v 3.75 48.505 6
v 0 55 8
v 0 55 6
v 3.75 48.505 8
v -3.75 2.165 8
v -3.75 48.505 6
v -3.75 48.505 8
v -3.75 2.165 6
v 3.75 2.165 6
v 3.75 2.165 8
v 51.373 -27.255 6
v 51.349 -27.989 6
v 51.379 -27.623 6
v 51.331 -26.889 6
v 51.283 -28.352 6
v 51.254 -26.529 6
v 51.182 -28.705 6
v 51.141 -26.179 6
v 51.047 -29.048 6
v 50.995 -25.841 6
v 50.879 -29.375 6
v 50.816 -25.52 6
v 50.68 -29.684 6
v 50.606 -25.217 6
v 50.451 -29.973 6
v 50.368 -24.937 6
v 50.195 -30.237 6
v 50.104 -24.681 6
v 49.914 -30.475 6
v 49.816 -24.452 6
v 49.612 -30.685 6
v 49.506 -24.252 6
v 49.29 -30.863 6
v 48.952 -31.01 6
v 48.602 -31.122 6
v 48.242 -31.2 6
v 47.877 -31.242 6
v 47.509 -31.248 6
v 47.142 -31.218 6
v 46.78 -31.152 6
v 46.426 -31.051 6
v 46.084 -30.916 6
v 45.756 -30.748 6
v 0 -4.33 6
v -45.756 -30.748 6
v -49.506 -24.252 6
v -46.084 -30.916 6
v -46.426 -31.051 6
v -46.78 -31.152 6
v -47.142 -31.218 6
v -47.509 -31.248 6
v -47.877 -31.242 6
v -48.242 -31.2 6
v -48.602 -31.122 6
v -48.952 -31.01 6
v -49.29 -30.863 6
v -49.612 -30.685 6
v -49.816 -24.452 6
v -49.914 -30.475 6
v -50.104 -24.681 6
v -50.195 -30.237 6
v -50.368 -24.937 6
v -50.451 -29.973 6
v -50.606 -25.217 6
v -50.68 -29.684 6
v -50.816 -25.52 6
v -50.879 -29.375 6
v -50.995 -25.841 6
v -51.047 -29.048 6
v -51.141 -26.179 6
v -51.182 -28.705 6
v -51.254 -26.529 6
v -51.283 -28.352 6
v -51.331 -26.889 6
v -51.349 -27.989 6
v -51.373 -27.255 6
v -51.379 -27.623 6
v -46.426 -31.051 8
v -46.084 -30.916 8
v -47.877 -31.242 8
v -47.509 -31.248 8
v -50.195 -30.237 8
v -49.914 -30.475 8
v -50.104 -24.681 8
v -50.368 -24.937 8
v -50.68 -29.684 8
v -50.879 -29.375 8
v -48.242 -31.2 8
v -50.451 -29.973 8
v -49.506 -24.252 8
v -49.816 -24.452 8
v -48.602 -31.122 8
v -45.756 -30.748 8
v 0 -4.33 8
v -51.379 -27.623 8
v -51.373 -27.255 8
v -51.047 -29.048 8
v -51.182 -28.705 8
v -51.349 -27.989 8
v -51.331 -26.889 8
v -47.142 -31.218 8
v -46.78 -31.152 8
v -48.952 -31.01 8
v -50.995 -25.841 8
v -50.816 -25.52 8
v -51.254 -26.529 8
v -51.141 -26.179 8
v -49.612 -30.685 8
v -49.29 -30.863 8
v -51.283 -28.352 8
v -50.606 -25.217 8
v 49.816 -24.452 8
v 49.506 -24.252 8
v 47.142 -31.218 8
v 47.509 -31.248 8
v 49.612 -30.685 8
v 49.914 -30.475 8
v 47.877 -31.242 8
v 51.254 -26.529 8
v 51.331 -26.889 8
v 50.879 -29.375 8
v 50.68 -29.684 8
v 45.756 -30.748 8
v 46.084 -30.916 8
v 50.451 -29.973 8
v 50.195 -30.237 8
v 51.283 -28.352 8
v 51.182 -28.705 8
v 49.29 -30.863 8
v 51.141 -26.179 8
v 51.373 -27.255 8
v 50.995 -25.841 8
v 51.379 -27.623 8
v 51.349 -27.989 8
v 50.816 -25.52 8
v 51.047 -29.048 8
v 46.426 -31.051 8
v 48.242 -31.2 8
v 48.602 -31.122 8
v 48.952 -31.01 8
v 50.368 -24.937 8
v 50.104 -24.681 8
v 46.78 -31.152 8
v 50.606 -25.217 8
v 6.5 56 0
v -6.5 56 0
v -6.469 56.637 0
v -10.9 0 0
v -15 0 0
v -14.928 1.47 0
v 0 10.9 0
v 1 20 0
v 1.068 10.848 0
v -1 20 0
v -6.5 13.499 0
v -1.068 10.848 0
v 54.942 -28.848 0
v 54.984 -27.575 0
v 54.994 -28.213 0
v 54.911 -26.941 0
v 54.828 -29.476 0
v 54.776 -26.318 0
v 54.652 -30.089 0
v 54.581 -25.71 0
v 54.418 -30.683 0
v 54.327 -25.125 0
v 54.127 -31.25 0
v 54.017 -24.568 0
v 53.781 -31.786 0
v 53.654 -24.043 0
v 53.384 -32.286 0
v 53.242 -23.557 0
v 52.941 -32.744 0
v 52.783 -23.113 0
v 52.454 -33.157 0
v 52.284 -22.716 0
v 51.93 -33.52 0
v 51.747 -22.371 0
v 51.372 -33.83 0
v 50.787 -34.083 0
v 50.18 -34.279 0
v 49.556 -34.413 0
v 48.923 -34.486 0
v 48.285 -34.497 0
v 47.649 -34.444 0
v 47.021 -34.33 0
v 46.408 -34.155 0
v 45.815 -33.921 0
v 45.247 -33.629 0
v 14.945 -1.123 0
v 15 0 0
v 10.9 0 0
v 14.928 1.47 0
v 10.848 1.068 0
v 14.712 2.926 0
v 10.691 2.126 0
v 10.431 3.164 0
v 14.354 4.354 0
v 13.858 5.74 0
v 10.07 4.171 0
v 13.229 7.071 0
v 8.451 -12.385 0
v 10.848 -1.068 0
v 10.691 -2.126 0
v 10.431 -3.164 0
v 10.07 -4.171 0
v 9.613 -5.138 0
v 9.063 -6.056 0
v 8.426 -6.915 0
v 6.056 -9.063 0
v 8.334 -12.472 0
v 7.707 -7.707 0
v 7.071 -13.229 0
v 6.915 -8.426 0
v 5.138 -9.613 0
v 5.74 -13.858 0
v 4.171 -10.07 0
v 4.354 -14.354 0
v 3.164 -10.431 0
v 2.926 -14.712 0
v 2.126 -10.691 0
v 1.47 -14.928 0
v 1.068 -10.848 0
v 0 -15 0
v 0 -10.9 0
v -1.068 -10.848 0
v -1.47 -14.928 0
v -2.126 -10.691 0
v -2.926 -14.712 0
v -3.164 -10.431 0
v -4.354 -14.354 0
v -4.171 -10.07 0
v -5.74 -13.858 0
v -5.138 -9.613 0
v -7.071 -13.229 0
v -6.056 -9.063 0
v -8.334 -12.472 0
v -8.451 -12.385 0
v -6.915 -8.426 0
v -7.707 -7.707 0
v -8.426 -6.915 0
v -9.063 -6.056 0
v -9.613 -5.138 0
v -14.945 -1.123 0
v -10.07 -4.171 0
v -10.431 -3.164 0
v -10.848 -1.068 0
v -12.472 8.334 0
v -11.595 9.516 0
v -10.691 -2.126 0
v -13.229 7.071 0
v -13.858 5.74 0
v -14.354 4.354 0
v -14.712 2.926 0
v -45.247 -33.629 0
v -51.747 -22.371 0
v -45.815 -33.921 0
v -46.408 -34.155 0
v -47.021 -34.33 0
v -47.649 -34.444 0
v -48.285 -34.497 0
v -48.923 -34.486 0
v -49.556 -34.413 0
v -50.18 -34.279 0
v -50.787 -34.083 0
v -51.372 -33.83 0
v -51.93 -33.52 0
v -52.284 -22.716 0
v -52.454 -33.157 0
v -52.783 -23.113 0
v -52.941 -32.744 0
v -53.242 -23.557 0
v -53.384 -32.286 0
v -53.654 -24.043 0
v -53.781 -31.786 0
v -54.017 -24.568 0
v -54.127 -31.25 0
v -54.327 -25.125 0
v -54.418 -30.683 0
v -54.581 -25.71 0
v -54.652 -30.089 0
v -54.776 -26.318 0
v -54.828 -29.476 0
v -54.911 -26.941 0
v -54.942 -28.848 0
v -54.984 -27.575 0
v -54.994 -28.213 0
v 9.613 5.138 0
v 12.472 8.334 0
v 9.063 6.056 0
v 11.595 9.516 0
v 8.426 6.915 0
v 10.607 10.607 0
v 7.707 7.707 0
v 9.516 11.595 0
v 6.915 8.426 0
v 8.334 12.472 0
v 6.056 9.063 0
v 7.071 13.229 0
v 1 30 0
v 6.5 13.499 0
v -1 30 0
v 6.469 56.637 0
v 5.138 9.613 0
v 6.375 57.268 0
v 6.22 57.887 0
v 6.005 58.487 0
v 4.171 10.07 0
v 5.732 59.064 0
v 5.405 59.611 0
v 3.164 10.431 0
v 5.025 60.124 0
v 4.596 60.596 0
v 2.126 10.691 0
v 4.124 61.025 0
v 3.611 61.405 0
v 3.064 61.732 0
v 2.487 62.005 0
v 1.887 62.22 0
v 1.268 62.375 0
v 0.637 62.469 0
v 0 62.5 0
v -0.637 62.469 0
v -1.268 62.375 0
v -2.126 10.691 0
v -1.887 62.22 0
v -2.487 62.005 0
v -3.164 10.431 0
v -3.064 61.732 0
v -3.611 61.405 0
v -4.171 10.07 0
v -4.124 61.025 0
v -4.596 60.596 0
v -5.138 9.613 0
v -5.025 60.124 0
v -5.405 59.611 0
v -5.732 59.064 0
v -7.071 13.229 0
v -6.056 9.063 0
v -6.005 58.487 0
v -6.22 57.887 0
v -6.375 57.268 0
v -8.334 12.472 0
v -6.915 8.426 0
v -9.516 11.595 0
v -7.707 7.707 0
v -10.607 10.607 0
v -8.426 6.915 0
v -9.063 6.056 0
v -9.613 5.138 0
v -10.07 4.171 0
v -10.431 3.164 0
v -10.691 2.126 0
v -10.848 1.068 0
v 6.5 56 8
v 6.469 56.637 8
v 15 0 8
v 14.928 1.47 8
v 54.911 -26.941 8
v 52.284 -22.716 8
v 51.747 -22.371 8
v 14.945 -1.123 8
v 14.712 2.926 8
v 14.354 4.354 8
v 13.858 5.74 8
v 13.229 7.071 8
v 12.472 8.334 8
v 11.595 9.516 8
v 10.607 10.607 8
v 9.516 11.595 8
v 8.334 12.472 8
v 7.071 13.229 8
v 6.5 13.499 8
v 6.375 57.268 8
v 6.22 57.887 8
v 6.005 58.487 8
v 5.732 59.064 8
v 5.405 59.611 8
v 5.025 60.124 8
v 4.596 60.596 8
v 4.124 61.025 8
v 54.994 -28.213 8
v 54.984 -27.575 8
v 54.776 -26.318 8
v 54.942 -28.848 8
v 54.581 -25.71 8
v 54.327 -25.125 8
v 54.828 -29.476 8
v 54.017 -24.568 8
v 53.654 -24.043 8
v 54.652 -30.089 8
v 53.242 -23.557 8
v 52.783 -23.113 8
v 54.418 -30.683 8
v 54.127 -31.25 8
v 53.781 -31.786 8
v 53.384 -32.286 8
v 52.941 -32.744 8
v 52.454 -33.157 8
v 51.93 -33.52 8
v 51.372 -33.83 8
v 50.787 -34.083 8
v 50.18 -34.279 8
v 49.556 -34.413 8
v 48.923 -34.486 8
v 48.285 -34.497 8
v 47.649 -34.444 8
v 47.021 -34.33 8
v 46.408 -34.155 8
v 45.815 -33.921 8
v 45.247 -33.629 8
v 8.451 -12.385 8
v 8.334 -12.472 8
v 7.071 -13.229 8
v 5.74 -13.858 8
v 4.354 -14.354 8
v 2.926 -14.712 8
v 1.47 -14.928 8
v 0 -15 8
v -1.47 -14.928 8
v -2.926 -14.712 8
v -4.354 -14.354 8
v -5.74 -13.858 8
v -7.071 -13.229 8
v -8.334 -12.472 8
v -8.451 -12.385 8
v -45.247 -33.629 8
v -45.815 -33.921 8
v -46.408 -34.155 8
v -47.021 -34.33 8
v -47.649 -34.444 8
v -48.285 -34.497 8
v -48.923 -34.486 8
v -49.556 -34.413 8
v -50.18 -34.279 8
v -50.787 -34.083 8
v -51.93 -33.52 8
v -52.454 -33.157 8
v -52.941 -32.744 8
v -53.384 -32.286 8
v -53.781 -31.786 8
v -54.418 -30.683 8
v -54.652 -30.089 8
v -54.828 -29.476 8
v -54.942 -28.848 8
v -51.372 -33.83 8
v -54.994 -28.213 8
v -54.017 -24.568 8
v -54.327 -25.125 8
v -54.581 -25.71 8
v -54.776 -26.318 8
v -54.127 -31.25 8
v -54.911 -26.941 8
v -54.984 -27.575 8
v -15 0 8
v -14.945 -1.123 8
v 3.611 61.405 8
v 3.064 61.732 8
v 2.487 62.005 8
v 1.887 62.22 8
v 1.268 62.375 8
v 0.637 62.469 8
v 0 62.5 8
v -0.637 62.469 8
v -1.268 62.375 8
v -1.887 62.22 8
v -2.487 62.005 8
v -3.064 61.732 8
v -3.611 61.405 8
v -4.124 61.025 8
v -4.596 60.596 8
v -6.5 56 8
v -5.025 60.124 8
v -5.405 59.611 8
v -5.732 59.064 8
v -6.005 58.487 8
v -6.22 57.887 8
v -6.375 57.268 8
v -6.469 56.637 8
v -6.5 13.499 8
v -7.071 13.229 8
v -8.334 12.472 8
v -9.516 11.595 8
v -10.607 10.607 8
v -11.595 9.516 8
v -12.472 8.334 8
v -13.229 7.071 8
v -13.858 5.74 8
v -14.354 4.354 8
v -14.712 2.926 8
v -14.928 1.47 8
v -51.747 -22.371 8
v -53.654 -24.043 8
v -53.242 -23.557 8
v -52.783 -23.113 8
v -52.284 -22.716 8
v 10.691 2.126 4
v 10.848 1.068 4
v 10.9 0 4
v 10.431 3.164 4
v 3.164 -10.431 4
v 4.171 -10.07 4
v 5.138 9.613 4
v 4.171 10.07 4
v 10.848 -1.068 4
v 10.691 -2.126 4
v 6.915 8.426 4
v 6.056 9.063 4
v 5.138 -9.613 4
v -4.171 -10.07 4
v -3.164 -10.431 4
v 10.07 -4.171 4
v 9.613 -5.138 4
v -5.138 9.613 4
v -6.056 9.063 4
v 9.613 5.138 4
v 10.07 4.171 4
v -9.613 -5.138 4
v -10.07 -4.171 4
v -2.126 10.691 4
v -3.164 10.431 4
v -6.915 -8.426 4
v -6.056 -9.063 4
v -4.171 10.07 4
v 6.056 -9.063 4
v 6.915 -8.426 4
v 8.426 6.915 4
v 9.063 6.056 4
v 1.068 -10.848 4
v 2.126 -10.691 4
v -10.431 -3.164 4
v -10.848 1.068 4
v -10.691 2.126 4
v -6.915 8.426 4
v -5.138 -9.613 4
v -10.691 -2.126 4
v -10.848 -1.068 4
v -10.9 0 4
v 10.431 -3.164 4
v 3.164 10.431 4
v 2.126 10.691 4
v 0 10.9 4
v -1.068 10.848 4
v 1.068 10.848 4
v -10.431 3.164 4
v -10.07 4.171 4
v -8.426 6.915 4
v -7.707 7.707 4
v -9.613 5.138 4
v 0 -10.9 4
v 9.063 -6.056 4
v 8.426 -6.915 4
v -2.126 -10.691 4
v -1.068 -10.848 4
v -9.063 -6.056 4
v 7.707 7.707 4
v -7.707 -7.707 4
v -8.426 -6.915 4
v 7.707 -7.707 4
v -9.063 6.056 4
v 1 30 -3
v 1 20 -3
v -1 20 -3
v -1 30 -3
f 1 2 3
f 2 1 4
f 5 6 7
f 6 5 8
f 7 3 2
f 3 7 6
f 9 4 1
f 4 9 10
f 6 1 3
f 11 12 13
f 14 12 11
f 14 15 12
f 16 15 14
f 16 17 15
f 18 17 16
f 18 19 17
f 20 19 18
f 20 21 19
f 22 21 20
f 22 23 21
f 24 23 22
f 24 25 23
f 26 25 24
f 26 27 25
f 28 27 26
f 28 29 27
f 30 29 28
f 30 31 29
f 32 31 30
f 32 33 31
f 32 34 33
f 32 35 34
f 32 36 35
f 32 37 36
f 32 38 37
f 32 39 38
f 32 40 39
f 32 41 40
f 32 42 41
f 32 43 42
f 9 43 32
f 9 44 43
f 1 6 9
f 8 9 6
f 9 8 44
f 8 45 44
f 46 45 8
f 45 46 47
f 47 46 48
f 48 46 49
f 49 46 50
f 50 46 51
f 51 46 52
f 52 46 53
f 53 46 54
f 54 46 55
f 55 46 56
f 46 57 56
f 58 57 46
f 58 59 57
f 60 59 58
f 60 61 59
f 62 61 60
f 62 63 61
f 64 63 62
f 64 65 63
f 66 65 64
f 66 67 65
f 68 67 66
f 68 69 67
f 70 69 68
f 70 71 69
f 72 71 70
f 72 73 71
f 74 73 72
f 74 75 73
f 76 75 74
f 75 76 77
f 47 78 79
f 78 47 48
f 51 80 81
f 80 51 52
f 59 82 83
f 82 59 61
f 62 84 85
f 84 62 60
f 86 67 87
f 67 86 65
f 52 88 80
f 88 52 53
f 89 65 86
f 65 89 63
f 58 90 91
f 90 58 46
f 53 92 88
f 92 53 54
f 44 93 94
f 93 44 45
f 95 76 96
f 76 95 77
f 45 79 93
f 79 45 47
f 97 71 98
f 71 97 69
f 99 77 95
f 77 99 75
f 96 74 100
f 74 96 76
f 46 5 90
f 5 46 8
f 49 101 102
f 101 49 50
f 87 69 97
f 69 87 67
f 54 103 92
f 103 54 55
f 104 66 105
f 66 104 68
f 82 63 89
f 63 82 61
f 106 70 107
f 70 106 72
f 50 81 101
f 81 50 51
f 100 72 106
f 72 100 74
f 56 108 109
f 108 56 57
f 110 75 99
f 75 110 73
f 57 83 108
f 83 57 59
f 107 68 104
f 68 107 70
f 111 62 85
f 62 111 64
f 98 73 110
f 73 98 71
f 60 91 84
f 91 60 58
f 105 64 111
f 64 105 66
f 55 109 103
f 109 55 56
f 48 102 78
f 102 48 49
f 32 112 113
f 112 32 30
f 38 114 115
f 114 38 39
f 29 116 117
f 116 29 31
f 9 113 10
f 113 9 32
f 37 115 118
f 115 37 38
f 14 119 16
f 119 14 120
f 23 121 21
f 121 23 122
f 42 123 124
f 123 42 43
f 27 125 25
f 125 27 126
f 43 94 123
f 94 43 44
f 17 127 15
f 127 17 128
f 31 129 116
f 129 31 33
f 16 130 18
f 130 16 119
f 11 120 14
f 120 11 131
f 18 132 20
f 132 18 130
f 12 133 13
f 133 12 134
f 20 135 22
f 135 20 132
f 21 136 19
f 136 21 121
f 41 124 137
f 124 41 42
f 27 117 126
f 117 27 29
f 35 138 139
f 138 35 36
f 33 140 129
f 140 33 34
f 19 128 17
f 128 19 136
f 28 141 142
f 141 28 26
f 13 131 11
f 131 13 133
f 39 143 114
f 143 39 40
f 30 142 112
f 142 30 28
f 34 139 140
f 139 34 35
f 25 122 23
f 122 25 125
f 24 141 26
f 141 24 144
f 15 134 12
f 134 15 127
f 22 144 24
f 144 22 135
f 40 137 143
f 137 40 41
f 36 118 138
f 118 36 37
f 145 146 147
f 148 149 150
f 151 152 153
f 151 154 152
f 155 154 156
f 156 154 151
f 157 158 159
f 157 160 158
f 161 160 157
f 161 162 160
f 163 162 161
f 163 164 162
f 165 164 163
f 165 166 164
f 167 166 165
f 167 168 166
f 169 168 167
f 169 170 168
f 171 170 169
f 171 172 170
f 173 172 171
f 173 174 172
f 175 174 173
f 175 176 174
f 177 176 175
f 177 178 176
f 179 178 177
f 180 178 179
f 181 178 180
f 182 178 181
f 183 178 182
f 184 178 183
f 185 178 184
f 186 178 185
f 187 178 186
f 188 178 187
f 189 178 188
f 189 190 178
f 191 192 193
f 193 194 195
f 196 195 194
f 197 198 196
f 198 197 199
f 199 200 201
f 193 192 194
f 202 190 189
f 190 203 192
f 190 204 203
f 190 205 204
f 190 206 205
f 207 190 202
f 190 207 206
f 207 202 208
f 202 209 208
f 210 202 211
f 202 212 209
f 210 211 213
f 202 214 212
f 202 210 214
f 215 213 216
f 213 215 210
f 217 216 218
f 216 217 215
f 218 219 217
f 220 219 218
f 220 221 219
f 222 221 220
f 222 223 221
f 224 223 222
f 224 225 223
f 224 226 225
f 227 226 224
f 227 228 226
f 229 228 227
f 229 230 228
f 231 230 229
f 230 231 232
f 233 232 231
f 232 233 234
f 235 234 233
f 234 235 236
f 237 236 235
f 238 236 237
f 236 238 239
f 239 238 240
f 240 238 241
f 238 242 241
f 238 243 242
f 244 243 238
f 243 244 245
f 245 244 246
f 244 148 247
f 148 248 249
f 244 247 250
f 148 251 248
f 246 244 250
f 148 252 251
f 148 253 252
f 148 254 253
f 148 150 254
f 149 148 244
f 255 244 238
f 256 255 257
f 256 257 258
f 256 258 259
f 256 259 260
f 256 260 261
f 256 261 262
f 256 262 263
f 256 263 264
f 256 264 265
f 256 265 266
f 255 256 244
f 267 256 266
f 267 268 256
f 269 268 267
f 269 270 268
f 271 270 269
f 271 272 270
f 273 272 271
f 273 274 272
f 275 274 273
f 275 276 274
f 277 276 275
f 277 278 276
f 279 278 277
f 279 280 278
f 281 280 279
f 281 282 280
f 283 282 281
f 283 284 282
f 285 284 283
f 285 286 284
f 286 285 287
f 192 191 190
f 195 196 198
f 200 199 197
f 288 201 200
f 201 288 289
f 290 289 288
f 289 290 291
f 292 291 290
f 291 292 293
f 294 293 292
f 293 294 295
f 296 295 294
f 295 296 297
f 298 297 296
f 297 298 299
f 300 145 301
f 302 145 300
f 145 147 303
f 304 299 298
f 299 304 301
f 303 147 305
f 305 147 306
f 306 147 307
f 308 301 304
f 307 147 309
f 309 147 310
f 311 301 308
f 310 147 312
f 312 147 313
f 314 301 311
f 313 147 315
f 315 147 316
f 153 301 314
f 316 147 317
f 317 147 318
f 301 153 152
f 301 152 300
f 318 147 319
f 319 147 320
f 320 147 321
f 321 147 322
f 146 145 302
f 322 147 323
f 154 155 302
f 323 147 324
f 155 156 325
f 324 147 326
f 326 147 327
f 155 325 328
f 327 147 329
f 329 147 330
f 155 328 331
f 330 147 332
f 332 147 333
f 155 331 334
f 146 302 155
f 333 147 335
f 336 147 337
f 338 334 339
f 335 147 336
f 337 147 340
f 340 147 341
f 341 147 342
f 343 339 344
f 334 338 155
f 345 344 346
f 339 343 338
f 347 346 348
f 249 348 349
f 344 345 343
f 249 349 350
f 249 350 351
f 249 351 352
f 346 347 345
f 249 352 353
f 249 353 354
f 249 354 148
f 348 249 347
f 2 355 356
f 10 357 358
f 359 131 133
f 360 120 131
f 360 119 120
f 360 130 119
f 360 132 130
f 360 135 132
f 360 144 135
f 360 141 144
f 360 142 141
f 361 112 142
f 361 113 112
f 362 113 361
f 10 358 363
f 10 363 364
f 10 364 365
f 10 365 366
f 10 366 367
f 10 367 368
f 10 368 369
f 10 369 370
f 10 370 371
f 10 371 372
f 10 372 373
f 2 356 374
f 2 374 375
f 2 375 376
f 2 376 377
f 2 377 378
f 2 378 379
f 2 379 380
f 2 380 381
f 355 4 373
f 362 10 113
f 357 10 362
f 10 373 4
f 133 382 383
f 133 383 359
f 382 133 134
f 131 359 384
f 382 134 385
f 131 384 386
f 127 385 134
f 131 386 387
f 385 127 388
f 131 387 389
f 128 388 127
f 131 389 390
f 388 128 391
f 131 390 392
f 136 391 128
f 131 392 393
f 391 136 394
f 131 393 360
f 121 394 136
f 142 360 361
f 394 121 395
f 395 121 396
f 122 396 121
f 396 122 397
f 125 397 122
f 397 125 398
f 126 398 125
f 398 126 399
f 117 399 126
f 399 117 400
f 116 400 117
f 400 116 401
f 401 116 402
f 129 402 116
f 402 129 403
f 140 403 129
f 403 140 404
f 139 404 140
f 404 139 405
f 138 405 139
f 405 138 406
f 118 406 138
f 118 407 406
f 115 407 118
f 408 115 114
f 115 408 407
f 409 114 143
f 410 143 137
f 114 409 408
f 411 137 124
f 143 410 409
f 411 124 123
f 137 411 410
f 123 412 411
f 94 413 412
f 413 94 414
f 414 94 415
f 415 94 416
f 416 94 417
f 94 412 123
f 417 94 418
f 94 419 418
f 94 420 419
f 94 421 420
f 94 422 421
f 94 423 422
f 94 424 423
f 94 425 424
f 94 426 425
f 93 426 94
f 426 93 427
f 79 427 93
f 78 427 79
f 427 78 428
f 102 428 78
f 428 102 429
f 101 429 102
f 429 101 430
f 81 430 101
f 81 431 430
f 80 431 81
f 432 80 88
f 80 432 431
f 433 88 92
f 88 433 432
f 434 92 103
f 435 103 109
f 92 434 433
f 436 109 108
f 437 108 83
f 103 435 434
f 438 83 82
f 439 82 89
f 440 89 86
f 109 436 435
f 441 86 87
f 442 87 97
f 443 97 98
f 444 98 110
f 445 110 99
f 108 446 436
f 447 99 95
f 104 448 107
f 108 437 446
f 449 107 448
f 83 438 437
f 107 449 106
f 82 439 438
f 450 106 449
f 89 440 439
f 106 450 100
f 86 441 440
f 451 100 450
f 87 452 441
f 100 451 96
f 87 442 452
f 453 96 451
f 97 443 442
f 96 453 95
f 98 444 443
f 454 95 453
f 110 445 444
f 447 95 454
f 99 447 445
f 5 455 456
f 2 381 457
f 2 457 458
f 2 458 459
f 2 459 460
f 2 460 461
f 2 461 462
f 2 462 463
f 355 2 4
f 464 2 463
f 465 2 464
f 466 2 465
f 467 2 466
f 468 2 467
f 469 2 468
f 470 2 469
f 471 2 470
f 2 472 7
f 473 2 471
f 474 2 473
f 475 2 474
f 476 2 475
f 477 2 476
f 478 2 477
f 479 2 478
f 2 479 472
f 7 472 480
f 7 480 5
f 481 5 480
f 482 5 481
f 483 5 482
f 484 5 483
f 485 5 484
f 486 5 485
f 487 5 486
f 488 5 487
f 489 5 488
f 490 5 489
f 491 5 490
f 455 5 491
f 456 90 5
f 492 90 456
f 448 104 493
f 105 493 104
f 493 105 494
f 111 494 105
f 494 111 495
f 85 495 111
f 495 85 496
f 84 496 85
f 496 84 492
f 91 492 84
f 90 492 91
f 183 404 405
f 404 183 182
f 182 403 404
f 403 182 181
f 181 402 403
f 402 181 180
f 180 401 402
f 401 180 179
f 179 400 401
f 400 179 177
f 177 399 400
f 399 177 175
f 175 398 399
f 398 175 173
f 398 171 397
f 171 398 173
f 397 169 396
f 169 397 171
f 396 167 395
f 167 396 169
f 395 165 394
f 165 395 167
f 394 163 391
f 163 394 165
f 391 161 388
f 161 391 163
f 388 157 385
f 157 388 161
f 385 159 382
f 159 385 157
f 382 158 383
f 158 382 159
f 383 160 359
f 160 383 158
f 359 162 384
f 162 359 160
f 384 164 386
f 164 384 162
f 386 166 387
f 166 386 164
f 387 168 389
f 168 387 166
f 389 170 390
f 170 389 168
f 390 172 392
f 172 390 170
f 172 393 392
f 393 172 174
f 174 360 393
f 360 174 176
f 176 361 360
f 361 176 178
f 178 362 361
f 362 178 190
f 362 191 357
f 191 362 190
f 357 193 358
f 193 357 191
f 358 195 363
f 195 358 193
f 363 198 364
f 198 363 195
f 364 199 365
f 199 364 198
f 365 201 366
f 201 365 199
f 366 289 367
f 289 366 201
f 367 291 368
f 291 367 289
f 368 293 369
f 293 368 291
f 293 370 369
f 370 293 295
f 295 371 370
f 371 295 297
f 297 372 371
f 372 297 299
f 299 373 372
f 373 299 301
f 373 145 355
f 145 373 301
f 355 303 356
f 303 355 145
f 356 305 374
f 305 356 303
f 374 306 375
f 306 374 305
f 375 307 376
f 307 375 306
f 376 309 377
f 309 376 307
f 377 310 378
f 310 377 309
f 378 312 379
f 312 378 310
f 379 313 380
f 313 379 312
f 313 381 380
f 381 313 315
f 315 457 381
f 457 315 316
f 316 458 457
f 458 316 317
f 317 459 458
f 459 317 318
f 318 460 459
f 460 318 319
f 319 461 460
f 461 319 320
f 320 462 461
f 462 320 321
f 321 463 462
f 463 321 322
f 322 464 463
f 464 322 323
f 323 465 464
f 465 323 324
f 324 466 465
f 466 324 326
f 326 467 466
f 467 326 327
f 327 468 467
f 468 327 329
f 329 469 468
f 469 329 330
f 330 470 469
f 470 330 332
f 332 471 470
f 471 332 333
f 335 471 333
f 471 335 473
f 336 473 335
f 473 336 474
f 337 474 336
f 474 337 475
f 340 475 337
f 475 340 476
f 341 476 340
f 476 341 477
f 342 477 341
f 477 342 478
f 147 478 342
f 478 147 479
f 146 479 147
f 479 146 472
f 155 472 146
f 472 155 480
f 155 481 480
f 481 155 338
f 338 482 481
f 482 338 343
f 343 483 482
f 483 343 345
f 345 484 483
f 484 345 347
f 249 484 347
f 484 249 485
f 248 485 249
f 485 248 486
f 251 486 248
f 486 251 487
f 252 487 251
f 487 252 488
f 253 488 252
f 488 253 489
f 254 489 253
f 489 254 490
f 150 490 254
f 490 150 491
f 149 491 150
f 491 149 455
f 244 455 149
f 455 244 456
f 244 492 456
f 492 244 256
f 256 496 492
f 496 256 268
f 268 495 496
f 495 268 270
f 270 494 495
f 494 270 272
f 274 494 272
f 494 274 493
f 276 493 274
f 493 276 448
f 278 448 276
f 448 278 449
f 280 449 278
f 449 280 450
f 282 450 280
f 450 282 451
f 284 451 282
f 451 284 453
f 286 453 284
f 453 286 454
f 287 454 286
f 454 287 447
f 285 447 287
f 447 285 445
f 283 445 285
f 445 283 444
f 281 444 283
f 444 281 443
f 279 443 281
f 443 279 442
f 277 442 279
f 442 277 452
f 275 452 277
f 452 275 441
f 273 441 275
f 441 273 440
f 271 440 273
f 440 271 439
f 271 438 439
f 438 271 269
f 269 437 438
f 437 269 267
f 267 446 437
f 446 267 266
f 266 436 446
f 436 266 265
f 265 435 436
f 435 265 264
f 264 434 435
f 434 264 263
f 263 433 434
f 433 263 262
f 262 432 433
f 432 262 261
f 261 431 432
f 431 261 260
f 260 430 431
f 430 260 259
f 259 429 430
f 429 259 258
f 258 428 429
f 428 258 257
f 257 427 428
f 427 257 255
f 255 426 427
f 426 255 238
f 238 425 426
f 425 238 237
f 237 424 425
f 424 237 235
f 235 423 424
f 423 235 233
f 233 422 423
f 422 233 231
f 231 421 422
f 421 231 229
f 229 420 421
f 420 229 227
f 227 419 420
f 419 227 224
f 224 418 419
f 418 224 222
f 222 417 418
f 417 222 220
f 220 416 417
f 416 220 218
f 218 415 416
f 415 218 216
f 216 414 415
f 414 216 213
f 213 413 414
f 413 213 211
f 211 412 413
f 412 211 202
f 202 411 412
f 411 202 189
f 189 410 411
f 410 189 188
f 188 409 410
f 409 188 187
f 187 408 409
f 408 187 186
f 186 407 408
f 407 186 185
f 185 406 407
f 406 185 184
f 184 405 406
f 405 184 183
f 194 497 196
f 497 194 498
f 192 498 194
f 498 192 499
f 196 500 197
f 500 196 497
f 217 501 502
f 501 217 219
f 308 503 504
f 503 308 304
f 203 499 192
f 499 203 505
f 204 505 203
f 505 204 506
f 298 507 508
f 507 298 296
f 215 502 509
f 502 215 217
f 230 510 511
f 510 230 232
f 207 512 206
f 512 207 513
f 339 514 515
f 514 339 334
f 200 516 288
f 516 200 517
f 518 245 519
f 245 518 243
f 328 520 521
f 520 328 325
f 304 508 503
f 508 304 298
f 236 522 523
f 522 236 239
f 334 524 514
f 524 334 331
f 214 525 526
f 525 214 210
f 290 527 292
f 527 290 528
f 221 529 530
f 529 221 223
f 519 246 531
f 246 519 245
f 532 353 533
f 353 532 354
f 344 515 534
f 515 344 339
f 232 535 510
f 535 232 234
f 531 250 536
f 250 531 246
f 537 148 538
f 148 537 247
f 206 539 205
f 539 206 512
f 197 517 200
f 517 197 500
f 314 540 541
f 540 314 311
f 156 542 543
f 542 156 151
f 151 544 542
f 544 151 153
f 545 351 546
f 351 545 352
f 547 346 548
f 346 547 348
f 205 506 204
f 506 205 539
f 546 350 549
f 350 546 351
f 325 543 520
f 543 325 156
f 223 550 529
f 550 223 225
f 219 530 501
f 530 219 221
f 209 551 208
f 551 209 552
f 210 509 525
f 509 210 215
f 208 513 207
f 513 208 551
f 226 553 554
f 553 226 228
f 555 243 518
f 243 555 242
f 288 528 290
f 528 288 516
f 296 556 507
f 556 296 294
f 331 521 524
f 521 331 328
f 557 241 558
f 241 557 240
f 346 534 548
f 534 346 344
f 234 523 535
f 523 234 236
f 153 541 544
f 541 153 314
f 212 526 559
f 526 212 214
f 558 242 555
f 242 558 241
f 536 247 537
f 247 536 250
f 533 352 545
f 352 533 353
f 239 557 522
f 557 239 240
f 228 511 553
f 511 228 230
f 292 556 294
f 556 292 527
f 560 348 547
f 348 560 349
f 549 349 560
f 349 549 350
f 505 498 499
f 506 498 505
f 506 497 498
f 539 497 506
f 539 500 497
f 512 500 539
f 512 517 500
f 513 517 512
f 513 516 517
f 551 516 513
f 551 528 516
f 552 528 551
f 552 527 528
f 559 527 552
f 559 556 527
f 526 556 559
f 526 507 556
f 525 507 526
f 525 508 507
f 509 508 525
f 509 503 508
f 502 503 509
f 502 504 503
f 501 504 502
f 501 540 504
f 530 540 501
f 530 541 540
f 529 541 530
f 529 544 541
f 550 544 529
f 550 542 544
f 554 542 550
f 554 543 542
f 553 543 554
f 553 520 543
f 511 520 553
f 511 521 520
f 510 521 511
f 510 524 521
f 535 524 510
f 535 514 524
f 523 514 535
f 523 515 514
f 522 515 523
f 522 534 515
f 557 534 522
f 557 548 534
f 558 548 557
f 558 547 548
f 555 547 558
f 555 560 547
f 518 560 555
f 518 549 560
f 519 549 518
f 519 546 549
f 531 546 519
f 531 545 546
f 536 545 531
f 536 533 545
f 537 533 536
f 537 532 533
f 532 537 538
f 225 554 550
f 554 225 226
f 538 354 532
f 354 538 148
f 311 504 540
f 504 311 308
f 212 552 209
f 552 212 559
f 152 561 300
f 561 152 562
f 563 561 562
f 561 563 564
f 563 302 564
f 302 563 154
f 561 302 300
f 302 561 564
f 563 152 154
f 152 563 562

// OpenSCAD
// ===================================================================
// Spinner (lazy susan rotating plate)
//
// The 3-arm rotating plate that sits on top of the base disc in
// mirror-spinner-stand.scad. Split out into its own file so the two
// halves -- this spinner and the stationary base + mirror stand --
// print (and are edited) independently.
//
// An optional tab hangs below the spinner's pointed (90-degree) arm
// and interlocks with two matching tabs on the base
// (mirror-spinner-stand.scad) to limit rotation to exactly 180
// degrees, from the pointer aimed at the mirror to aimed directly
// away from it. Toggle it with has_rotation_stop below; the
// corresponding half of the mechanism in mirror-spinner-stand.scad
// has its own independent toggle, so set both true for the stop to
// actually work.
//
// Several dimensions here (arm_length/arm_width via object_width,
// hub_diameter, and the rotation-stop parameters) must match the
// values baked into mirror-spinner-stand.scad's spinner_sweep_radius
// and stop tabs -- see the comments there.
//
// Axes: X/Y = footprint, Z = up, centered on the origin (the spinner
// axis), sitting on Z = 0.
// ===================================================================

/* [Dimensions of the object (mm)] */
leg_diameter          = 3;    // must match leg_diameter in impossible.scad
foot_height           = 2;    // must match foot_height in impossible.scad
foot_width_90         = 7;    // must match foot_width_90 in impossible.scad
foot_diameter_others  = 7;    // must match foot_diameter_others in impossible.scad
object_width          = 110;  // must match width in impossible.scad; sets how far the groove arms reach

/* [Overall plate dimensions (mm)] */
box_height   = 8;    // Z: overall plate thickness
arm_length   = object_width / 2 + 1;   // center to rounded outer tip of each arm; must match mirror-spinner-stand.scad's spinner_sweep_radius
arm_width    = 13;   // width of each arm (main shape tuning parameter); must match mirror-spinner-stand.scad's spinner_sweep_radius
hub_diameter = 30;   // central round hub joining the three arms

/* [Top groove for the impossible-object feet] */
groove_clearance      = .5;    // groove is this much wider than the feet
groove_depth          = foot_height;  // groove depth matches the foot so it sits fully recessed
groove_length         = object_width / 2;  // length of each arm from the center

/* [Bottom insert pocket (mm)] */
insert_diameter       = 21.6;    // your round insert diameter
insert_clearance      = 0.2;   // small added diameter for snug fit
insert_pocket_depth   = 4;     // pocket depth from bottom face

/* [Rotation stop] */
has_rotation_stop = true;  // adds the tab below the pointed arm that limits rotation to 180 degrees; must match mirror-spinner-stand.scad's base_stop_tabs for the stop to work
stop_width = 2;   // mm, tangential width of the stop tab; must match mirror-spinner-stand.scad
stop_r_in  = 20;  // mm, inner radius of the stop tab; must match mirror-spinner-stand.scad
stop_r_out = 30;  // mm, outer radius of the stop tab; must match mirror-spinner-stand.scad
stop_drop  = 3;   // mm, how far the tab hangs below the spinner's bottom face

/* [Preview / debug helpers] */
show_top_groove = true;

plate_color = "DeepSkyBlue";

$fn = 64;

// ===== Checks =====
assert(arm_width > max(leg_diameter, foot_width_90, foot_diameter_others) + groove_clearance,
    "arm_width must be wider than the widest groove arm");
assert(hub_diameter >= arm_width,
    "hub_diameter should be at least arm_width so the center blend stays smooth");
assert(groove_depth > 0 && groove_depth < box_height,
    "groove_depth must be greater than 0 and less than box_height");
assert(insert_pocket_depth > 0 && insert_pocket_depth < box_height,
    "insert_pocket_depth must be greater than 0 and less than box_height");
assert(groove_length + max(leg_diameter, foot_width_90, foot_diameter_others) / 2 + groove_clearance
        <= arm_length + arm_width / 2,
    "groove arms reach past the end of the plate arm; decrease groove_length/object_width or increase arm_length");
assert(groove_length > (foot_width_90 + groove_clearance) * sqrt(3) / 2,
    "groove_length is too short for the fish-eye tip on the 90-degree arm; increase groove_length/object_width or decrease foot_width_90/groove_clearance");
assert(stop_width > 0 && stop_width < arm_width,
    "stop_width must be positive and narrower than arm_width so the spinner's tab stays inside the pointed arm");
assert(stop_r_in > hub_diameter / 2 && stop_r_in < stop_r_out,
    "stop_r_in must be past the hub and less than stop_r_out");
assert(stop_r_out < arm_length,
    "stop_r_out must be less than arm_length so it stays on the spinner's arm");
assert(stop_drop > 0, "stop_drop must be positive");

// ===== Derived values =====

// Radius of the circle swept by the spinner arms' rounded tips. Must
// match the spinner_sweep_radius baked into mirror-spinner-stand.scad.
spinner_sweep_radius = arm_length + arm_width / 2;

// ===== Spinner geometry =====

// Rounded 2D arm using two equal circles so both ends are curved.
module arm_capsule_2d(l, w) {
    hull() {
        circle(d = w);
        translate([l, 0])
            circle(d = w);
    }
}

// Symmetric three-arm footprint with curved outer ends.
module three_arm_plate_2d(l, w, hub_d) {
    union() {
        circle(d = hub_d);
        for (a = [90, 210, 330])
            rotate([0, 0, a])
                arm_capsule_2d(l, w);
    }
}

// Straight-sided slot, width w, that the almond-shaped foot on the
// 90-degree leg can slide down into.
module fisheye_slot_2d(w, l) {
    tip_reach = w * sqrt(3) / 2;
    straight_end = l - tip_reach;
    union() {
        circle(d = w);
        polygon(points = [
            [0, -w / 2],
            [straight_end, -w / 2],
            [l, 0],
            [straight_end, w / 2],
            [0, w / 2],
        ]);
    }
}

// Y-shaped centering groove sunk into the top face.
module top_groove() {
    for (a = [90, 210, 330]) {
        gw = max(leg_diameter,
                 a == 90 ? foot_width_90 : foot_diameter_others)
             + groove_clearance;
        rotate([0, 0, a])
            linear_extrude(height = groove_depth + 1)
                if (a == 90)
                    fisheye_slot_2d(gw, groove_length);
                else
                    hull() {
                        circle(d = gw);
                        translate([groove_length, 0])
                            circle(d = gw);
                    }
    }
}

// Rotation-stop tab on the spinner: a rib centered on the pointed
// (90-degree) arm's centerline (the local +Y axis), running from
// stop_r_in to stop_r_out and hanging stop_drop mm below the spinner's
// flat bottom face (Z = 0). Meets the two stop tabs on the base (see
// mirror-spinner-stand.scad's base_stop_tabs()) to limit the spinner
// to exactly 180 degrees of rotation. Printable without supports: the
// model's bottom face (Z = 0) is the face placed UP when printing
// groove-side-down per the notes at the end of this file, so this tab
// prints as a simple upward-facing rib, not an overhang.
module spinner_stop_tab() {
    translate([-stop_width / 2, stop_r_in, -stop_drop])
        cube([stop_width, stop_r_out - stop_r_in, stop_drop]);
}

module lazy_susan_plate() {
    union() {
        difference() {
            linear_extrude(height = box_height)
                three_arm_plate_2d(arm_length, arm_width, hub_diameter);

            // Round recess in the underside for a press-fit insert.
            translate([0, 0, -1])
                cylinder(d = insert_diameter + insert_clearance,
                         h = insert_pocket_depth + 1);

            if (show_top_groove)
                translate([0, 0, box_height - groove_depth])
                    top_groove();
        }
        if (has_rotation_stop)
            spinner_stop_tab();
    }
}

echo(str("Spinner: 3-arm, height ", box_height, " mm, sweep radius ", spinner_sweep_radius, " mm"));
echo(str("Top groove: ", groove_depth, " mm deep, arms ", groove_length, " mm long"));
echo(str("Bottom insert pocket: d=", insert_diameter + insert_clearance,
         " mm, depth=", insert_pocket_depth, " mm"));
echo(has_rotation_stop
    ? str("Rotation stop tab: r=", stop_r_in, " to ", stop_r_out,
          " mm, ", stop_width, " mm wide, drops ", stop_drop, " mm below the bottom face")
    : "Rotation stop tab: disabled");

color(plate_color) lazy_susan_plate();

// ===================================================================
// Printing notes
// ===================================================================
// Print top (groove) face DOWN on the build plate -- this also puts
// the rotation-stop tab (which hangs below the bottom/Z=0 face, if
// enabled) pointing straight UP once flipped onto the bed, so it
// prints as a simple upright rib with no overhang and needs no
// supports.
// ===================================================================
